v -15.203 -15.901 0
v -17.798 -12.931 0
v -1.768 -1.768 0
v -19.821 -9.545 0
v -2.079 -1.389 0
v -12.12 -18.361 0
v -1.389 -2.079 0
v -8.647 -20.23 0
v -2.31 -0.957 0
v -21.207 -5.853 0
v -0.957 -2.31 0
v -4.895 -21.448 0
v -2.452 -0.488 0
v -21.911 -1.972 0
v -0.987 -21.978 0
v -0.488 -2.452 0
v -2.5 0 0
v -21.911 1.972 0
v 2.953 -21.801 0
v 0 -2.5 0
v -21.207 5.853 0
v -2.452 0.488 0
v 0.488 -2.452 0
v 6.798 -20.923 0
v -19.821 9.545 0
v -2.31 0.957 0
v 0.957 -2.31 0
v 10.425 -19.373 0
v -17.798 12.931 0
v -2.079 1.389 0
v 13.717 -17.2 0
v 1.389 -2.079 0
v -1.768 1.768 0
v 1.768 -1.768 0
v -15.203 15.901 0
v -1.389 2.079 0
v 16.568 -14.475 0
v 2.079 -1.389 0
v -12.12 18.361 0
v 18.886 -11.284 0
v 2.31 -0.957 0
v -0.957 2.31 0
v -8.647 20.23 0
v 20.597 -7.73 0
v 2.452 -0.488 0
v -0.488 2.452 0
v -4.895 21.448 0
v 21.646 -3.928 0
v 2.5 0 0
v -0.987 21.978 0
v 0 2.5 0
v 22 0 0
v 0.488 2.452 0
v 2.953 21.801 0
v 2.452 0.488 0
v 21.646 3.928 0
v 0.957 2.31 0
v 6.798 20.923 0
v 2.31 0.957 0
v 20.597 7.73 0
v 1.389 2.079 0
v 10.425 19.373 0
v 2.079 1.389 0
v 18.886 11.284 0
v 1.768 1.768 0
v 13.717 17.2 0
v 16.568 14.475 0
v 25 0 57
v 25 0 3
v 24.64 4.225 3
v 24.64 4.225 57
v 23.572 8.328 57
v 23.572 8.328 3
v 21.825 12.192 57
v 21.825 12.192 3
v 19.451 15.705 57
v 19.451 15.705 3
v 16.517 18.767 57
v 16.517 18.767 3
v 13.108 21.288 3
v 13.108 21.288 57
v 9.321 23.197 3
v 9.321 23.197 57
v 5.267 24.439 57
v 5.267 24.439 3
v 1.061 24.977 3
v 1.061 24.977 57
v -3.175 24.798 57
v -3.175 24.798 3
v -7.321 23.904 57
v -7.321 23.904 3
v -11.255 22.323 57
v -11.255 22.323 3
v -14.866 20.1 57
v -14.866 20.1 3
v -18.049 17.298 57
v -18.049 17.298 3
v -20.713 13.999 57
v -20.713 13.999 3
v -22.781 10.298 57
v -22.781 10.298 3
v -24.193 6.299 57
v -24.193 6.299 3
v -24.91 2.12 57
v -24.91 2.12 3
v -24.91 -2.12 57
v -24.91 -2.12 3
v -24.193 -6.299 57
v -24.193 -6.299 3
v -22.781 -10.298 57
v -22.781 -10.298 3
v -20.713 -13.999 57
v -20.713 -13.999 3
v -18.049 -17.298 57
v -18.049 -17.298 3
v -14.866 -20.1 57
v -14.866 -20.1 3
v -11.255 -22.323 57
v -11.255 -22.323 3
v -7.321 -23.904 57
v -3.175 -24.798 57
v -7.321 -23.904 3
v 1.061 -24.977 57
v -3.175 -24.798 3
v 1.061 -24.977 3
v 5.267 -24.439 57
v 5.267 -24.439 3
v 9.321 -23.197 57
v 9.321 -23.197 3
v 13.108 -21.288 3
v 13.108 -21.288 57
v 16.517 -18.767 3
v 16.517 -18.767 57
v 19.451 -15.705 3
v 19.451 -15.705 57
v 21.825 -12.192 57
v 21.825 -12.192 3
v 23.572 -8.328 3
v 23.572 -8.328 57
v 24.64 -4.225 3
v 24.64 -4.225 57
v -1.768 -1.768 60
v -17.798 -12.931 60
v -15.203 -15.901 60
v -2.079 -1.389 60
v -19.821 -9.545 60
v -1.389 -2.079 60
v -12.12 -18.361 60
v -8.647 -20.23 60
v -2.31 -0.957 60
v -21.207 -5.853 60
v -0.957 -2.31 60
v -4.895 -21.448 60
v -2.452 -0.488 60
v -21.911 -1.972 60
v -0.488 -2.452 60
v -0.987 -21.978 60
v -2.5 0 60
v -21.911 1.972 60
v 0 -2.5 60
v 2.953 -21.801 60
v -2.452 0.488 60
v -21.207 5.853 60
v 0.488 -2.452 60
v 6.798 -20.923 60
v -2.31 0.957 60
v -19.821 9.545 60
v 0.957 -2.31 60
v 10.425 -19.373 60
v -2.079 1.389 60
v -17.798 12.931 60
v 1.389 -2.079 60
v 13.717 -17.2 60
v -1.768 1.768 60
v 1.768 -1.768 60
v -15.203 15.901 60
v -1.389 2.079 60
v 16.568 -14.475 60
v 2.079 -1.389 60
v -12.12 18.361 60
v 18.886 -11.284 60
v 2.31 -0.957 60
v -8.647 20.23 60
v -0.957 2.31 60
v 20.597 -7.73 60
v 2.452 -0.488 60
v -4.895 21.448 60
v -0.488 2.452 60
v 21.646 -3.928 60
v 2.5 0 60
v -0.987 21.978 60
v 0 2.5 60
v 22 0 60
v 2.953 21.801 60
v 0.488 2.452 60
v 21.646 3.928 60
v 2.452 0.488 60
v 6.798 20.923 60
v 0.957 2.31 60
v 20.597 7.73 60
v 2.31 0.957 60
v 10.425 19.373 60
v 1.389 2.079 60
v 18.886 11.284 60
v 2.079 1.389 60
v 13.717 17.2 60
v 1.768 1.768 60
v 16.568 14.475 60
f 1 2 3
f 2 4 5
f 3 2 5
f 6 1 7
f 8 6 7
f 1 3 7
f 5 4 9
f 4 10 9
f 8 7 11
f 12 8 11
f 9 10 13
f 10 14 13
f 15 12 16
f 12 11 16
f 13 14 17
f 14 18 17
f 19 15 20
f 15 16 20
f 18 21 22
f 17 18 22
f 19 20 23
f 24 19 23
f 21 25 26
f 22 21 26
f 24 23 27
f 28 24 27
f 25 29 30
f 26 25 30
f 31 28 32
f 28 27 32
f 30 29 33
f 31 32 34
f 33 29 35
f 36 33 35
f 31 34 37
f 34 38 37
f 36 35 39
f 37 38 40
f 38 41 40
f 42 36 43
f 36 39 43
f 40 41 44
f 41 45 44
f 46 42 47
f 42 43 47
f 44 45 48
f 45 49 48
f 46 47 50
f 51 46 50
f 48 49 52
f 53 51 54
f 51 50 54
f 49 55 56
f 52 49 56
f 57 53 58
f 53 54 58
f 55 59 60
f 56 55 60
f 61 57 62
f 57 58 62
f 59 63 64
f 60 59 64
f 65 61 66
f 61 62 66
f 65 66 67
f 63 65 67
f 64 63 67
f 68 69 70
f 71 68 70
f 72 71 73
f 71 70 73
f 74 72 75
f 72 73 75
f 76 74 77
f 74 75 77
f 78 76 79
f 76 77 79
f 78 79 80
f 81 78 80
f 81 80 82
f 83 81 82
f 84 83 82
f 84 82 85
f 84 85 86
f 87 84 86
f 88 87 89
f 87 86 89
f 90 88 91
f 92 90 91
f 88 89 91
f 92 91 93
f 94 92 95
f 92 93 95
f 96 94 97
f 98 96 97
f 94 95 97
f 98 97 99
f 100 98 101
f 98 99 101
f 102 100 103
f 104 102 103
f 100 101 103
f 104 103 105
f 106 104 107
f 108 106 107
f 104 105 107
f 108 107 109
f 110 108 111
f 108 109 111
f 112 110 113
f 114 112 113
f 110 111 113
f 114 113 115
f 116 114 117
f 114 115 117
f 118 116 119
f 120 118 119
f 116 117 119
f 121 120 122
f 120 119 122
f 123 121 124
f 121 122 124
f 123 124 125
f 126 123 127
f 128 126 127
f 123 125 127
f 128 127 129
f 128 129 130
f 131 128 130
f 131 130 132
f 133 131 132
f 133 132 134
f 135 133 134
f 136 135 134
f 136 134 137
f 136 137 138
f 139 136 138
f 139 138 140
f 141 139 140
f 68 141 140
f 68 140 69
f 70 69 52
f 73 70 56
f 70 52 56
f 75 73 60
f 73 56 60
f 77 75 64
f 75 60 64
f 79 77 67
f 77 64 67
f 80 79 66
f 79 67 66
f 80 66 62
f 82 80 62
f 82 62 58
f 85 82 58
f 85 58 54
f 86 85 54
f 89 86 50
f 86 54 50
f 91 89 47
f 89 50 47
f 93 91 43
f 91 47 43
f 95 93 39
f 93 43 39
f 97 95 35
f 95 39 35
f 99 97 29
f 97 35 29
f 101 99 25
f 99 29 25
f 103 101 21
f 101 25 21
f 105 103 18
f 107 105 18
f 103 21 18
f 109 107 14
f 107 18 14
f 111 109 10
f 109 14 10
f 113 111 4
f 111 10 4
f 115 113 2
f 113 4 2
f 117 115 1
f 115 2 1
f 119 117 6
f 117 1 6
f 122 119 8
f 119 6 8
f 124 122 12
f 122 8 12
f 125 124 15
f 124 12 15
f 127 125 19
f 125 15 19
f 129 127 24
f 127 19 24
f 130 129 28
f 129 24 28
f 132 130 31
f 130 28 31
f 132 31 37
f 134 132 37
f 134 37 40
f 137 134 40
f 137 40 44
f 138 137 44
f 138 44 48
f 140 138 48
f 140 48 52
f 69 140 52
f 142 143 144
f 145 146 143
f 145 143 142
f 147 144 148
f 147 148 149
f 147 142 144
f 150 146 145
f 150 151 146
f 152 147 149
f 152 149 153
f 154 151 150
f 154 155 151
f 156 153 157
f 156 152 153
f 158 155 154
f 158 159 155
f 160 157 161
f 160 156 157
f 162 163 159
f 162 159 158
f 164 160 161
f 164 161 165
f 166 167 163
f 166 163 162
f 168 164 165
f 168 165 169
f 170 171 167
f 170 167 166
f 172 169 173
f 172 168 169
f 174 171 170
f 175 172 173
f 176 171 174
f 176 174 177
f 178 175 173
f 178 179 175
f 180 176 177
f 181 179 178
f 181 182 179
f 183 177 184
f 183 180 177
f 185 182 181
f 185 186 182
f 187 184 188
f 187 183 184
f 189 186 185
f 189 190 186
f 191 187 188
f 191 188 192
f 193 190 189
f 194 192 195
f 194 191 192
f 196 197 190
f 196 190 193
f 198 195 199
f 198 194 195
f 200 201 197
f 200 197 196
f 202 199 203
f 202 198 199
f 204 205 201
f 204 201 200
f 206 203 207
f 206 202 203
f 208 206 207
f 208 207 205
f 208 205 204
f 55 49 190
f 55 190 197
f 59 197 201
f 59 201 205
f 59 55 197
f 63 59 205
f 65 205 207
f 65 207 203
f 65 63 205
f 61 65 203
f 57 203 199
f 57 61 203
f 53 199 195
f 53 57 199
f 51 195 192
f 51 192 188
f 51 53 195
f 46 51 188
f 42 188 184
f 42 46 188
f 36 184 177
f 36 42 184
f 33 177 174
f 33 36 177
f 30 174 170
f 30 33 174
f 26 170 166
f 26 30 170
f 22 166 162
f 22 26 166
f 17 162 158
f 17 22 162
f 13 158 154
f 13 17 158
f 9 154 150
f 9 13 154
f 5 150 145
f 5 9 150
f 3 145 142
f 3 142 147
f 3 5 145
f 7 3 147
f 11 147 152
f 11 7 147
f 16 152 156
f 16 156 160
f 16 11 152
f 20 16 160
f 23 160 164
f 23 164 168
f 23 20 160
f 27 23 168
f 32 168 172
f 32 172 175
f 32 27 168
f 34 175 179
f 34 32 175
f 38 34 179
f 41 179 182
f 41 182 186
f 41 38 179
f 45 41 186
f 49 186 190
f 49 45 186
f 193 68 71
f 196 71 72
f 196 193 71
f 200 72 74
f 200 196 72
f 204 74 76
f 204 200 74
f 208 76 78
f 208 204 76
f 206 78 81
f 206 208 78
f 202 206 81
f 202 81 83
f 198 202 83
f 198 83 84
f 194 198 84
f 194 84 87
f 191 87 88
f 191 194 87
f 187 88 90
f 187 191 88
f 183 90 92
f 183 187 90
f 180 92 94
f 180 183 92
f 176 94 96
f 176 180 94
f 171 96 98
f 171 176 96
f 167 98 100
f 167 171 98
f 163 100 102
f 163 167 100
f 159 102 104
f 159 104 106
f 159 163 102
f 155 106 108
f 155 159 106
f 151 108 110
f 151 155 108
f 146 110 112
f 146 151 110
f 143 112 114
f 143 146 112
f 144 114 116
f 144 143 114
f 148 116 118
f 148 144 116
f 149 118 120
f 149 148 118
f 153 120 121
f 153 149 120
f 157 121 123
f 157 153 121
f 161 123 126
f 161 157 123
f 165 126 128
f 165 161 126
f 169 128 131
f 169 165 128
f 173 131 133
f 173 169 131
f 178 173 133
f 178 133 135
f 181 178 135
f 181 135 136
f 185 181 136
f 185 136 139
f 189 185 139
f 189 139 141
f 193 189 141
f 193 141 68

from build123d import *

# Parameters (mm, degrees)
F0_R     = 25
F0_R_2   = 2.5
F1_DEPTH = 60
F2_DEPTH = 60
F3_SIZE  = 3


with BuildPart() as f1:
    # F0 (on Top) → F1 (new body)
    with BuildSketch(Plane.XY):
        Circle(F0_R)
        Circle(F0_R_2, mode=Mode.SUBTRACT)
        Circle(F0_R_2)
    extrude(amount=F1_DEPTH)

    # F0 (on Top) → F2 (cut)
    with BuildSketch(Plane.XY):
        Circle(F0_R_2)
    extrude(amount=F2_DEPTH, mode=Mode.SUBTRACT)

    # F3
    f3_edges = [f1.edges().sort_by_distance(p)[0] for p in [
        (-25, 0, 60),
        (-25, 0, 0),
    ]]
    chamfer(f3_edges, length=F3_SIZE)


solid = f1.part
